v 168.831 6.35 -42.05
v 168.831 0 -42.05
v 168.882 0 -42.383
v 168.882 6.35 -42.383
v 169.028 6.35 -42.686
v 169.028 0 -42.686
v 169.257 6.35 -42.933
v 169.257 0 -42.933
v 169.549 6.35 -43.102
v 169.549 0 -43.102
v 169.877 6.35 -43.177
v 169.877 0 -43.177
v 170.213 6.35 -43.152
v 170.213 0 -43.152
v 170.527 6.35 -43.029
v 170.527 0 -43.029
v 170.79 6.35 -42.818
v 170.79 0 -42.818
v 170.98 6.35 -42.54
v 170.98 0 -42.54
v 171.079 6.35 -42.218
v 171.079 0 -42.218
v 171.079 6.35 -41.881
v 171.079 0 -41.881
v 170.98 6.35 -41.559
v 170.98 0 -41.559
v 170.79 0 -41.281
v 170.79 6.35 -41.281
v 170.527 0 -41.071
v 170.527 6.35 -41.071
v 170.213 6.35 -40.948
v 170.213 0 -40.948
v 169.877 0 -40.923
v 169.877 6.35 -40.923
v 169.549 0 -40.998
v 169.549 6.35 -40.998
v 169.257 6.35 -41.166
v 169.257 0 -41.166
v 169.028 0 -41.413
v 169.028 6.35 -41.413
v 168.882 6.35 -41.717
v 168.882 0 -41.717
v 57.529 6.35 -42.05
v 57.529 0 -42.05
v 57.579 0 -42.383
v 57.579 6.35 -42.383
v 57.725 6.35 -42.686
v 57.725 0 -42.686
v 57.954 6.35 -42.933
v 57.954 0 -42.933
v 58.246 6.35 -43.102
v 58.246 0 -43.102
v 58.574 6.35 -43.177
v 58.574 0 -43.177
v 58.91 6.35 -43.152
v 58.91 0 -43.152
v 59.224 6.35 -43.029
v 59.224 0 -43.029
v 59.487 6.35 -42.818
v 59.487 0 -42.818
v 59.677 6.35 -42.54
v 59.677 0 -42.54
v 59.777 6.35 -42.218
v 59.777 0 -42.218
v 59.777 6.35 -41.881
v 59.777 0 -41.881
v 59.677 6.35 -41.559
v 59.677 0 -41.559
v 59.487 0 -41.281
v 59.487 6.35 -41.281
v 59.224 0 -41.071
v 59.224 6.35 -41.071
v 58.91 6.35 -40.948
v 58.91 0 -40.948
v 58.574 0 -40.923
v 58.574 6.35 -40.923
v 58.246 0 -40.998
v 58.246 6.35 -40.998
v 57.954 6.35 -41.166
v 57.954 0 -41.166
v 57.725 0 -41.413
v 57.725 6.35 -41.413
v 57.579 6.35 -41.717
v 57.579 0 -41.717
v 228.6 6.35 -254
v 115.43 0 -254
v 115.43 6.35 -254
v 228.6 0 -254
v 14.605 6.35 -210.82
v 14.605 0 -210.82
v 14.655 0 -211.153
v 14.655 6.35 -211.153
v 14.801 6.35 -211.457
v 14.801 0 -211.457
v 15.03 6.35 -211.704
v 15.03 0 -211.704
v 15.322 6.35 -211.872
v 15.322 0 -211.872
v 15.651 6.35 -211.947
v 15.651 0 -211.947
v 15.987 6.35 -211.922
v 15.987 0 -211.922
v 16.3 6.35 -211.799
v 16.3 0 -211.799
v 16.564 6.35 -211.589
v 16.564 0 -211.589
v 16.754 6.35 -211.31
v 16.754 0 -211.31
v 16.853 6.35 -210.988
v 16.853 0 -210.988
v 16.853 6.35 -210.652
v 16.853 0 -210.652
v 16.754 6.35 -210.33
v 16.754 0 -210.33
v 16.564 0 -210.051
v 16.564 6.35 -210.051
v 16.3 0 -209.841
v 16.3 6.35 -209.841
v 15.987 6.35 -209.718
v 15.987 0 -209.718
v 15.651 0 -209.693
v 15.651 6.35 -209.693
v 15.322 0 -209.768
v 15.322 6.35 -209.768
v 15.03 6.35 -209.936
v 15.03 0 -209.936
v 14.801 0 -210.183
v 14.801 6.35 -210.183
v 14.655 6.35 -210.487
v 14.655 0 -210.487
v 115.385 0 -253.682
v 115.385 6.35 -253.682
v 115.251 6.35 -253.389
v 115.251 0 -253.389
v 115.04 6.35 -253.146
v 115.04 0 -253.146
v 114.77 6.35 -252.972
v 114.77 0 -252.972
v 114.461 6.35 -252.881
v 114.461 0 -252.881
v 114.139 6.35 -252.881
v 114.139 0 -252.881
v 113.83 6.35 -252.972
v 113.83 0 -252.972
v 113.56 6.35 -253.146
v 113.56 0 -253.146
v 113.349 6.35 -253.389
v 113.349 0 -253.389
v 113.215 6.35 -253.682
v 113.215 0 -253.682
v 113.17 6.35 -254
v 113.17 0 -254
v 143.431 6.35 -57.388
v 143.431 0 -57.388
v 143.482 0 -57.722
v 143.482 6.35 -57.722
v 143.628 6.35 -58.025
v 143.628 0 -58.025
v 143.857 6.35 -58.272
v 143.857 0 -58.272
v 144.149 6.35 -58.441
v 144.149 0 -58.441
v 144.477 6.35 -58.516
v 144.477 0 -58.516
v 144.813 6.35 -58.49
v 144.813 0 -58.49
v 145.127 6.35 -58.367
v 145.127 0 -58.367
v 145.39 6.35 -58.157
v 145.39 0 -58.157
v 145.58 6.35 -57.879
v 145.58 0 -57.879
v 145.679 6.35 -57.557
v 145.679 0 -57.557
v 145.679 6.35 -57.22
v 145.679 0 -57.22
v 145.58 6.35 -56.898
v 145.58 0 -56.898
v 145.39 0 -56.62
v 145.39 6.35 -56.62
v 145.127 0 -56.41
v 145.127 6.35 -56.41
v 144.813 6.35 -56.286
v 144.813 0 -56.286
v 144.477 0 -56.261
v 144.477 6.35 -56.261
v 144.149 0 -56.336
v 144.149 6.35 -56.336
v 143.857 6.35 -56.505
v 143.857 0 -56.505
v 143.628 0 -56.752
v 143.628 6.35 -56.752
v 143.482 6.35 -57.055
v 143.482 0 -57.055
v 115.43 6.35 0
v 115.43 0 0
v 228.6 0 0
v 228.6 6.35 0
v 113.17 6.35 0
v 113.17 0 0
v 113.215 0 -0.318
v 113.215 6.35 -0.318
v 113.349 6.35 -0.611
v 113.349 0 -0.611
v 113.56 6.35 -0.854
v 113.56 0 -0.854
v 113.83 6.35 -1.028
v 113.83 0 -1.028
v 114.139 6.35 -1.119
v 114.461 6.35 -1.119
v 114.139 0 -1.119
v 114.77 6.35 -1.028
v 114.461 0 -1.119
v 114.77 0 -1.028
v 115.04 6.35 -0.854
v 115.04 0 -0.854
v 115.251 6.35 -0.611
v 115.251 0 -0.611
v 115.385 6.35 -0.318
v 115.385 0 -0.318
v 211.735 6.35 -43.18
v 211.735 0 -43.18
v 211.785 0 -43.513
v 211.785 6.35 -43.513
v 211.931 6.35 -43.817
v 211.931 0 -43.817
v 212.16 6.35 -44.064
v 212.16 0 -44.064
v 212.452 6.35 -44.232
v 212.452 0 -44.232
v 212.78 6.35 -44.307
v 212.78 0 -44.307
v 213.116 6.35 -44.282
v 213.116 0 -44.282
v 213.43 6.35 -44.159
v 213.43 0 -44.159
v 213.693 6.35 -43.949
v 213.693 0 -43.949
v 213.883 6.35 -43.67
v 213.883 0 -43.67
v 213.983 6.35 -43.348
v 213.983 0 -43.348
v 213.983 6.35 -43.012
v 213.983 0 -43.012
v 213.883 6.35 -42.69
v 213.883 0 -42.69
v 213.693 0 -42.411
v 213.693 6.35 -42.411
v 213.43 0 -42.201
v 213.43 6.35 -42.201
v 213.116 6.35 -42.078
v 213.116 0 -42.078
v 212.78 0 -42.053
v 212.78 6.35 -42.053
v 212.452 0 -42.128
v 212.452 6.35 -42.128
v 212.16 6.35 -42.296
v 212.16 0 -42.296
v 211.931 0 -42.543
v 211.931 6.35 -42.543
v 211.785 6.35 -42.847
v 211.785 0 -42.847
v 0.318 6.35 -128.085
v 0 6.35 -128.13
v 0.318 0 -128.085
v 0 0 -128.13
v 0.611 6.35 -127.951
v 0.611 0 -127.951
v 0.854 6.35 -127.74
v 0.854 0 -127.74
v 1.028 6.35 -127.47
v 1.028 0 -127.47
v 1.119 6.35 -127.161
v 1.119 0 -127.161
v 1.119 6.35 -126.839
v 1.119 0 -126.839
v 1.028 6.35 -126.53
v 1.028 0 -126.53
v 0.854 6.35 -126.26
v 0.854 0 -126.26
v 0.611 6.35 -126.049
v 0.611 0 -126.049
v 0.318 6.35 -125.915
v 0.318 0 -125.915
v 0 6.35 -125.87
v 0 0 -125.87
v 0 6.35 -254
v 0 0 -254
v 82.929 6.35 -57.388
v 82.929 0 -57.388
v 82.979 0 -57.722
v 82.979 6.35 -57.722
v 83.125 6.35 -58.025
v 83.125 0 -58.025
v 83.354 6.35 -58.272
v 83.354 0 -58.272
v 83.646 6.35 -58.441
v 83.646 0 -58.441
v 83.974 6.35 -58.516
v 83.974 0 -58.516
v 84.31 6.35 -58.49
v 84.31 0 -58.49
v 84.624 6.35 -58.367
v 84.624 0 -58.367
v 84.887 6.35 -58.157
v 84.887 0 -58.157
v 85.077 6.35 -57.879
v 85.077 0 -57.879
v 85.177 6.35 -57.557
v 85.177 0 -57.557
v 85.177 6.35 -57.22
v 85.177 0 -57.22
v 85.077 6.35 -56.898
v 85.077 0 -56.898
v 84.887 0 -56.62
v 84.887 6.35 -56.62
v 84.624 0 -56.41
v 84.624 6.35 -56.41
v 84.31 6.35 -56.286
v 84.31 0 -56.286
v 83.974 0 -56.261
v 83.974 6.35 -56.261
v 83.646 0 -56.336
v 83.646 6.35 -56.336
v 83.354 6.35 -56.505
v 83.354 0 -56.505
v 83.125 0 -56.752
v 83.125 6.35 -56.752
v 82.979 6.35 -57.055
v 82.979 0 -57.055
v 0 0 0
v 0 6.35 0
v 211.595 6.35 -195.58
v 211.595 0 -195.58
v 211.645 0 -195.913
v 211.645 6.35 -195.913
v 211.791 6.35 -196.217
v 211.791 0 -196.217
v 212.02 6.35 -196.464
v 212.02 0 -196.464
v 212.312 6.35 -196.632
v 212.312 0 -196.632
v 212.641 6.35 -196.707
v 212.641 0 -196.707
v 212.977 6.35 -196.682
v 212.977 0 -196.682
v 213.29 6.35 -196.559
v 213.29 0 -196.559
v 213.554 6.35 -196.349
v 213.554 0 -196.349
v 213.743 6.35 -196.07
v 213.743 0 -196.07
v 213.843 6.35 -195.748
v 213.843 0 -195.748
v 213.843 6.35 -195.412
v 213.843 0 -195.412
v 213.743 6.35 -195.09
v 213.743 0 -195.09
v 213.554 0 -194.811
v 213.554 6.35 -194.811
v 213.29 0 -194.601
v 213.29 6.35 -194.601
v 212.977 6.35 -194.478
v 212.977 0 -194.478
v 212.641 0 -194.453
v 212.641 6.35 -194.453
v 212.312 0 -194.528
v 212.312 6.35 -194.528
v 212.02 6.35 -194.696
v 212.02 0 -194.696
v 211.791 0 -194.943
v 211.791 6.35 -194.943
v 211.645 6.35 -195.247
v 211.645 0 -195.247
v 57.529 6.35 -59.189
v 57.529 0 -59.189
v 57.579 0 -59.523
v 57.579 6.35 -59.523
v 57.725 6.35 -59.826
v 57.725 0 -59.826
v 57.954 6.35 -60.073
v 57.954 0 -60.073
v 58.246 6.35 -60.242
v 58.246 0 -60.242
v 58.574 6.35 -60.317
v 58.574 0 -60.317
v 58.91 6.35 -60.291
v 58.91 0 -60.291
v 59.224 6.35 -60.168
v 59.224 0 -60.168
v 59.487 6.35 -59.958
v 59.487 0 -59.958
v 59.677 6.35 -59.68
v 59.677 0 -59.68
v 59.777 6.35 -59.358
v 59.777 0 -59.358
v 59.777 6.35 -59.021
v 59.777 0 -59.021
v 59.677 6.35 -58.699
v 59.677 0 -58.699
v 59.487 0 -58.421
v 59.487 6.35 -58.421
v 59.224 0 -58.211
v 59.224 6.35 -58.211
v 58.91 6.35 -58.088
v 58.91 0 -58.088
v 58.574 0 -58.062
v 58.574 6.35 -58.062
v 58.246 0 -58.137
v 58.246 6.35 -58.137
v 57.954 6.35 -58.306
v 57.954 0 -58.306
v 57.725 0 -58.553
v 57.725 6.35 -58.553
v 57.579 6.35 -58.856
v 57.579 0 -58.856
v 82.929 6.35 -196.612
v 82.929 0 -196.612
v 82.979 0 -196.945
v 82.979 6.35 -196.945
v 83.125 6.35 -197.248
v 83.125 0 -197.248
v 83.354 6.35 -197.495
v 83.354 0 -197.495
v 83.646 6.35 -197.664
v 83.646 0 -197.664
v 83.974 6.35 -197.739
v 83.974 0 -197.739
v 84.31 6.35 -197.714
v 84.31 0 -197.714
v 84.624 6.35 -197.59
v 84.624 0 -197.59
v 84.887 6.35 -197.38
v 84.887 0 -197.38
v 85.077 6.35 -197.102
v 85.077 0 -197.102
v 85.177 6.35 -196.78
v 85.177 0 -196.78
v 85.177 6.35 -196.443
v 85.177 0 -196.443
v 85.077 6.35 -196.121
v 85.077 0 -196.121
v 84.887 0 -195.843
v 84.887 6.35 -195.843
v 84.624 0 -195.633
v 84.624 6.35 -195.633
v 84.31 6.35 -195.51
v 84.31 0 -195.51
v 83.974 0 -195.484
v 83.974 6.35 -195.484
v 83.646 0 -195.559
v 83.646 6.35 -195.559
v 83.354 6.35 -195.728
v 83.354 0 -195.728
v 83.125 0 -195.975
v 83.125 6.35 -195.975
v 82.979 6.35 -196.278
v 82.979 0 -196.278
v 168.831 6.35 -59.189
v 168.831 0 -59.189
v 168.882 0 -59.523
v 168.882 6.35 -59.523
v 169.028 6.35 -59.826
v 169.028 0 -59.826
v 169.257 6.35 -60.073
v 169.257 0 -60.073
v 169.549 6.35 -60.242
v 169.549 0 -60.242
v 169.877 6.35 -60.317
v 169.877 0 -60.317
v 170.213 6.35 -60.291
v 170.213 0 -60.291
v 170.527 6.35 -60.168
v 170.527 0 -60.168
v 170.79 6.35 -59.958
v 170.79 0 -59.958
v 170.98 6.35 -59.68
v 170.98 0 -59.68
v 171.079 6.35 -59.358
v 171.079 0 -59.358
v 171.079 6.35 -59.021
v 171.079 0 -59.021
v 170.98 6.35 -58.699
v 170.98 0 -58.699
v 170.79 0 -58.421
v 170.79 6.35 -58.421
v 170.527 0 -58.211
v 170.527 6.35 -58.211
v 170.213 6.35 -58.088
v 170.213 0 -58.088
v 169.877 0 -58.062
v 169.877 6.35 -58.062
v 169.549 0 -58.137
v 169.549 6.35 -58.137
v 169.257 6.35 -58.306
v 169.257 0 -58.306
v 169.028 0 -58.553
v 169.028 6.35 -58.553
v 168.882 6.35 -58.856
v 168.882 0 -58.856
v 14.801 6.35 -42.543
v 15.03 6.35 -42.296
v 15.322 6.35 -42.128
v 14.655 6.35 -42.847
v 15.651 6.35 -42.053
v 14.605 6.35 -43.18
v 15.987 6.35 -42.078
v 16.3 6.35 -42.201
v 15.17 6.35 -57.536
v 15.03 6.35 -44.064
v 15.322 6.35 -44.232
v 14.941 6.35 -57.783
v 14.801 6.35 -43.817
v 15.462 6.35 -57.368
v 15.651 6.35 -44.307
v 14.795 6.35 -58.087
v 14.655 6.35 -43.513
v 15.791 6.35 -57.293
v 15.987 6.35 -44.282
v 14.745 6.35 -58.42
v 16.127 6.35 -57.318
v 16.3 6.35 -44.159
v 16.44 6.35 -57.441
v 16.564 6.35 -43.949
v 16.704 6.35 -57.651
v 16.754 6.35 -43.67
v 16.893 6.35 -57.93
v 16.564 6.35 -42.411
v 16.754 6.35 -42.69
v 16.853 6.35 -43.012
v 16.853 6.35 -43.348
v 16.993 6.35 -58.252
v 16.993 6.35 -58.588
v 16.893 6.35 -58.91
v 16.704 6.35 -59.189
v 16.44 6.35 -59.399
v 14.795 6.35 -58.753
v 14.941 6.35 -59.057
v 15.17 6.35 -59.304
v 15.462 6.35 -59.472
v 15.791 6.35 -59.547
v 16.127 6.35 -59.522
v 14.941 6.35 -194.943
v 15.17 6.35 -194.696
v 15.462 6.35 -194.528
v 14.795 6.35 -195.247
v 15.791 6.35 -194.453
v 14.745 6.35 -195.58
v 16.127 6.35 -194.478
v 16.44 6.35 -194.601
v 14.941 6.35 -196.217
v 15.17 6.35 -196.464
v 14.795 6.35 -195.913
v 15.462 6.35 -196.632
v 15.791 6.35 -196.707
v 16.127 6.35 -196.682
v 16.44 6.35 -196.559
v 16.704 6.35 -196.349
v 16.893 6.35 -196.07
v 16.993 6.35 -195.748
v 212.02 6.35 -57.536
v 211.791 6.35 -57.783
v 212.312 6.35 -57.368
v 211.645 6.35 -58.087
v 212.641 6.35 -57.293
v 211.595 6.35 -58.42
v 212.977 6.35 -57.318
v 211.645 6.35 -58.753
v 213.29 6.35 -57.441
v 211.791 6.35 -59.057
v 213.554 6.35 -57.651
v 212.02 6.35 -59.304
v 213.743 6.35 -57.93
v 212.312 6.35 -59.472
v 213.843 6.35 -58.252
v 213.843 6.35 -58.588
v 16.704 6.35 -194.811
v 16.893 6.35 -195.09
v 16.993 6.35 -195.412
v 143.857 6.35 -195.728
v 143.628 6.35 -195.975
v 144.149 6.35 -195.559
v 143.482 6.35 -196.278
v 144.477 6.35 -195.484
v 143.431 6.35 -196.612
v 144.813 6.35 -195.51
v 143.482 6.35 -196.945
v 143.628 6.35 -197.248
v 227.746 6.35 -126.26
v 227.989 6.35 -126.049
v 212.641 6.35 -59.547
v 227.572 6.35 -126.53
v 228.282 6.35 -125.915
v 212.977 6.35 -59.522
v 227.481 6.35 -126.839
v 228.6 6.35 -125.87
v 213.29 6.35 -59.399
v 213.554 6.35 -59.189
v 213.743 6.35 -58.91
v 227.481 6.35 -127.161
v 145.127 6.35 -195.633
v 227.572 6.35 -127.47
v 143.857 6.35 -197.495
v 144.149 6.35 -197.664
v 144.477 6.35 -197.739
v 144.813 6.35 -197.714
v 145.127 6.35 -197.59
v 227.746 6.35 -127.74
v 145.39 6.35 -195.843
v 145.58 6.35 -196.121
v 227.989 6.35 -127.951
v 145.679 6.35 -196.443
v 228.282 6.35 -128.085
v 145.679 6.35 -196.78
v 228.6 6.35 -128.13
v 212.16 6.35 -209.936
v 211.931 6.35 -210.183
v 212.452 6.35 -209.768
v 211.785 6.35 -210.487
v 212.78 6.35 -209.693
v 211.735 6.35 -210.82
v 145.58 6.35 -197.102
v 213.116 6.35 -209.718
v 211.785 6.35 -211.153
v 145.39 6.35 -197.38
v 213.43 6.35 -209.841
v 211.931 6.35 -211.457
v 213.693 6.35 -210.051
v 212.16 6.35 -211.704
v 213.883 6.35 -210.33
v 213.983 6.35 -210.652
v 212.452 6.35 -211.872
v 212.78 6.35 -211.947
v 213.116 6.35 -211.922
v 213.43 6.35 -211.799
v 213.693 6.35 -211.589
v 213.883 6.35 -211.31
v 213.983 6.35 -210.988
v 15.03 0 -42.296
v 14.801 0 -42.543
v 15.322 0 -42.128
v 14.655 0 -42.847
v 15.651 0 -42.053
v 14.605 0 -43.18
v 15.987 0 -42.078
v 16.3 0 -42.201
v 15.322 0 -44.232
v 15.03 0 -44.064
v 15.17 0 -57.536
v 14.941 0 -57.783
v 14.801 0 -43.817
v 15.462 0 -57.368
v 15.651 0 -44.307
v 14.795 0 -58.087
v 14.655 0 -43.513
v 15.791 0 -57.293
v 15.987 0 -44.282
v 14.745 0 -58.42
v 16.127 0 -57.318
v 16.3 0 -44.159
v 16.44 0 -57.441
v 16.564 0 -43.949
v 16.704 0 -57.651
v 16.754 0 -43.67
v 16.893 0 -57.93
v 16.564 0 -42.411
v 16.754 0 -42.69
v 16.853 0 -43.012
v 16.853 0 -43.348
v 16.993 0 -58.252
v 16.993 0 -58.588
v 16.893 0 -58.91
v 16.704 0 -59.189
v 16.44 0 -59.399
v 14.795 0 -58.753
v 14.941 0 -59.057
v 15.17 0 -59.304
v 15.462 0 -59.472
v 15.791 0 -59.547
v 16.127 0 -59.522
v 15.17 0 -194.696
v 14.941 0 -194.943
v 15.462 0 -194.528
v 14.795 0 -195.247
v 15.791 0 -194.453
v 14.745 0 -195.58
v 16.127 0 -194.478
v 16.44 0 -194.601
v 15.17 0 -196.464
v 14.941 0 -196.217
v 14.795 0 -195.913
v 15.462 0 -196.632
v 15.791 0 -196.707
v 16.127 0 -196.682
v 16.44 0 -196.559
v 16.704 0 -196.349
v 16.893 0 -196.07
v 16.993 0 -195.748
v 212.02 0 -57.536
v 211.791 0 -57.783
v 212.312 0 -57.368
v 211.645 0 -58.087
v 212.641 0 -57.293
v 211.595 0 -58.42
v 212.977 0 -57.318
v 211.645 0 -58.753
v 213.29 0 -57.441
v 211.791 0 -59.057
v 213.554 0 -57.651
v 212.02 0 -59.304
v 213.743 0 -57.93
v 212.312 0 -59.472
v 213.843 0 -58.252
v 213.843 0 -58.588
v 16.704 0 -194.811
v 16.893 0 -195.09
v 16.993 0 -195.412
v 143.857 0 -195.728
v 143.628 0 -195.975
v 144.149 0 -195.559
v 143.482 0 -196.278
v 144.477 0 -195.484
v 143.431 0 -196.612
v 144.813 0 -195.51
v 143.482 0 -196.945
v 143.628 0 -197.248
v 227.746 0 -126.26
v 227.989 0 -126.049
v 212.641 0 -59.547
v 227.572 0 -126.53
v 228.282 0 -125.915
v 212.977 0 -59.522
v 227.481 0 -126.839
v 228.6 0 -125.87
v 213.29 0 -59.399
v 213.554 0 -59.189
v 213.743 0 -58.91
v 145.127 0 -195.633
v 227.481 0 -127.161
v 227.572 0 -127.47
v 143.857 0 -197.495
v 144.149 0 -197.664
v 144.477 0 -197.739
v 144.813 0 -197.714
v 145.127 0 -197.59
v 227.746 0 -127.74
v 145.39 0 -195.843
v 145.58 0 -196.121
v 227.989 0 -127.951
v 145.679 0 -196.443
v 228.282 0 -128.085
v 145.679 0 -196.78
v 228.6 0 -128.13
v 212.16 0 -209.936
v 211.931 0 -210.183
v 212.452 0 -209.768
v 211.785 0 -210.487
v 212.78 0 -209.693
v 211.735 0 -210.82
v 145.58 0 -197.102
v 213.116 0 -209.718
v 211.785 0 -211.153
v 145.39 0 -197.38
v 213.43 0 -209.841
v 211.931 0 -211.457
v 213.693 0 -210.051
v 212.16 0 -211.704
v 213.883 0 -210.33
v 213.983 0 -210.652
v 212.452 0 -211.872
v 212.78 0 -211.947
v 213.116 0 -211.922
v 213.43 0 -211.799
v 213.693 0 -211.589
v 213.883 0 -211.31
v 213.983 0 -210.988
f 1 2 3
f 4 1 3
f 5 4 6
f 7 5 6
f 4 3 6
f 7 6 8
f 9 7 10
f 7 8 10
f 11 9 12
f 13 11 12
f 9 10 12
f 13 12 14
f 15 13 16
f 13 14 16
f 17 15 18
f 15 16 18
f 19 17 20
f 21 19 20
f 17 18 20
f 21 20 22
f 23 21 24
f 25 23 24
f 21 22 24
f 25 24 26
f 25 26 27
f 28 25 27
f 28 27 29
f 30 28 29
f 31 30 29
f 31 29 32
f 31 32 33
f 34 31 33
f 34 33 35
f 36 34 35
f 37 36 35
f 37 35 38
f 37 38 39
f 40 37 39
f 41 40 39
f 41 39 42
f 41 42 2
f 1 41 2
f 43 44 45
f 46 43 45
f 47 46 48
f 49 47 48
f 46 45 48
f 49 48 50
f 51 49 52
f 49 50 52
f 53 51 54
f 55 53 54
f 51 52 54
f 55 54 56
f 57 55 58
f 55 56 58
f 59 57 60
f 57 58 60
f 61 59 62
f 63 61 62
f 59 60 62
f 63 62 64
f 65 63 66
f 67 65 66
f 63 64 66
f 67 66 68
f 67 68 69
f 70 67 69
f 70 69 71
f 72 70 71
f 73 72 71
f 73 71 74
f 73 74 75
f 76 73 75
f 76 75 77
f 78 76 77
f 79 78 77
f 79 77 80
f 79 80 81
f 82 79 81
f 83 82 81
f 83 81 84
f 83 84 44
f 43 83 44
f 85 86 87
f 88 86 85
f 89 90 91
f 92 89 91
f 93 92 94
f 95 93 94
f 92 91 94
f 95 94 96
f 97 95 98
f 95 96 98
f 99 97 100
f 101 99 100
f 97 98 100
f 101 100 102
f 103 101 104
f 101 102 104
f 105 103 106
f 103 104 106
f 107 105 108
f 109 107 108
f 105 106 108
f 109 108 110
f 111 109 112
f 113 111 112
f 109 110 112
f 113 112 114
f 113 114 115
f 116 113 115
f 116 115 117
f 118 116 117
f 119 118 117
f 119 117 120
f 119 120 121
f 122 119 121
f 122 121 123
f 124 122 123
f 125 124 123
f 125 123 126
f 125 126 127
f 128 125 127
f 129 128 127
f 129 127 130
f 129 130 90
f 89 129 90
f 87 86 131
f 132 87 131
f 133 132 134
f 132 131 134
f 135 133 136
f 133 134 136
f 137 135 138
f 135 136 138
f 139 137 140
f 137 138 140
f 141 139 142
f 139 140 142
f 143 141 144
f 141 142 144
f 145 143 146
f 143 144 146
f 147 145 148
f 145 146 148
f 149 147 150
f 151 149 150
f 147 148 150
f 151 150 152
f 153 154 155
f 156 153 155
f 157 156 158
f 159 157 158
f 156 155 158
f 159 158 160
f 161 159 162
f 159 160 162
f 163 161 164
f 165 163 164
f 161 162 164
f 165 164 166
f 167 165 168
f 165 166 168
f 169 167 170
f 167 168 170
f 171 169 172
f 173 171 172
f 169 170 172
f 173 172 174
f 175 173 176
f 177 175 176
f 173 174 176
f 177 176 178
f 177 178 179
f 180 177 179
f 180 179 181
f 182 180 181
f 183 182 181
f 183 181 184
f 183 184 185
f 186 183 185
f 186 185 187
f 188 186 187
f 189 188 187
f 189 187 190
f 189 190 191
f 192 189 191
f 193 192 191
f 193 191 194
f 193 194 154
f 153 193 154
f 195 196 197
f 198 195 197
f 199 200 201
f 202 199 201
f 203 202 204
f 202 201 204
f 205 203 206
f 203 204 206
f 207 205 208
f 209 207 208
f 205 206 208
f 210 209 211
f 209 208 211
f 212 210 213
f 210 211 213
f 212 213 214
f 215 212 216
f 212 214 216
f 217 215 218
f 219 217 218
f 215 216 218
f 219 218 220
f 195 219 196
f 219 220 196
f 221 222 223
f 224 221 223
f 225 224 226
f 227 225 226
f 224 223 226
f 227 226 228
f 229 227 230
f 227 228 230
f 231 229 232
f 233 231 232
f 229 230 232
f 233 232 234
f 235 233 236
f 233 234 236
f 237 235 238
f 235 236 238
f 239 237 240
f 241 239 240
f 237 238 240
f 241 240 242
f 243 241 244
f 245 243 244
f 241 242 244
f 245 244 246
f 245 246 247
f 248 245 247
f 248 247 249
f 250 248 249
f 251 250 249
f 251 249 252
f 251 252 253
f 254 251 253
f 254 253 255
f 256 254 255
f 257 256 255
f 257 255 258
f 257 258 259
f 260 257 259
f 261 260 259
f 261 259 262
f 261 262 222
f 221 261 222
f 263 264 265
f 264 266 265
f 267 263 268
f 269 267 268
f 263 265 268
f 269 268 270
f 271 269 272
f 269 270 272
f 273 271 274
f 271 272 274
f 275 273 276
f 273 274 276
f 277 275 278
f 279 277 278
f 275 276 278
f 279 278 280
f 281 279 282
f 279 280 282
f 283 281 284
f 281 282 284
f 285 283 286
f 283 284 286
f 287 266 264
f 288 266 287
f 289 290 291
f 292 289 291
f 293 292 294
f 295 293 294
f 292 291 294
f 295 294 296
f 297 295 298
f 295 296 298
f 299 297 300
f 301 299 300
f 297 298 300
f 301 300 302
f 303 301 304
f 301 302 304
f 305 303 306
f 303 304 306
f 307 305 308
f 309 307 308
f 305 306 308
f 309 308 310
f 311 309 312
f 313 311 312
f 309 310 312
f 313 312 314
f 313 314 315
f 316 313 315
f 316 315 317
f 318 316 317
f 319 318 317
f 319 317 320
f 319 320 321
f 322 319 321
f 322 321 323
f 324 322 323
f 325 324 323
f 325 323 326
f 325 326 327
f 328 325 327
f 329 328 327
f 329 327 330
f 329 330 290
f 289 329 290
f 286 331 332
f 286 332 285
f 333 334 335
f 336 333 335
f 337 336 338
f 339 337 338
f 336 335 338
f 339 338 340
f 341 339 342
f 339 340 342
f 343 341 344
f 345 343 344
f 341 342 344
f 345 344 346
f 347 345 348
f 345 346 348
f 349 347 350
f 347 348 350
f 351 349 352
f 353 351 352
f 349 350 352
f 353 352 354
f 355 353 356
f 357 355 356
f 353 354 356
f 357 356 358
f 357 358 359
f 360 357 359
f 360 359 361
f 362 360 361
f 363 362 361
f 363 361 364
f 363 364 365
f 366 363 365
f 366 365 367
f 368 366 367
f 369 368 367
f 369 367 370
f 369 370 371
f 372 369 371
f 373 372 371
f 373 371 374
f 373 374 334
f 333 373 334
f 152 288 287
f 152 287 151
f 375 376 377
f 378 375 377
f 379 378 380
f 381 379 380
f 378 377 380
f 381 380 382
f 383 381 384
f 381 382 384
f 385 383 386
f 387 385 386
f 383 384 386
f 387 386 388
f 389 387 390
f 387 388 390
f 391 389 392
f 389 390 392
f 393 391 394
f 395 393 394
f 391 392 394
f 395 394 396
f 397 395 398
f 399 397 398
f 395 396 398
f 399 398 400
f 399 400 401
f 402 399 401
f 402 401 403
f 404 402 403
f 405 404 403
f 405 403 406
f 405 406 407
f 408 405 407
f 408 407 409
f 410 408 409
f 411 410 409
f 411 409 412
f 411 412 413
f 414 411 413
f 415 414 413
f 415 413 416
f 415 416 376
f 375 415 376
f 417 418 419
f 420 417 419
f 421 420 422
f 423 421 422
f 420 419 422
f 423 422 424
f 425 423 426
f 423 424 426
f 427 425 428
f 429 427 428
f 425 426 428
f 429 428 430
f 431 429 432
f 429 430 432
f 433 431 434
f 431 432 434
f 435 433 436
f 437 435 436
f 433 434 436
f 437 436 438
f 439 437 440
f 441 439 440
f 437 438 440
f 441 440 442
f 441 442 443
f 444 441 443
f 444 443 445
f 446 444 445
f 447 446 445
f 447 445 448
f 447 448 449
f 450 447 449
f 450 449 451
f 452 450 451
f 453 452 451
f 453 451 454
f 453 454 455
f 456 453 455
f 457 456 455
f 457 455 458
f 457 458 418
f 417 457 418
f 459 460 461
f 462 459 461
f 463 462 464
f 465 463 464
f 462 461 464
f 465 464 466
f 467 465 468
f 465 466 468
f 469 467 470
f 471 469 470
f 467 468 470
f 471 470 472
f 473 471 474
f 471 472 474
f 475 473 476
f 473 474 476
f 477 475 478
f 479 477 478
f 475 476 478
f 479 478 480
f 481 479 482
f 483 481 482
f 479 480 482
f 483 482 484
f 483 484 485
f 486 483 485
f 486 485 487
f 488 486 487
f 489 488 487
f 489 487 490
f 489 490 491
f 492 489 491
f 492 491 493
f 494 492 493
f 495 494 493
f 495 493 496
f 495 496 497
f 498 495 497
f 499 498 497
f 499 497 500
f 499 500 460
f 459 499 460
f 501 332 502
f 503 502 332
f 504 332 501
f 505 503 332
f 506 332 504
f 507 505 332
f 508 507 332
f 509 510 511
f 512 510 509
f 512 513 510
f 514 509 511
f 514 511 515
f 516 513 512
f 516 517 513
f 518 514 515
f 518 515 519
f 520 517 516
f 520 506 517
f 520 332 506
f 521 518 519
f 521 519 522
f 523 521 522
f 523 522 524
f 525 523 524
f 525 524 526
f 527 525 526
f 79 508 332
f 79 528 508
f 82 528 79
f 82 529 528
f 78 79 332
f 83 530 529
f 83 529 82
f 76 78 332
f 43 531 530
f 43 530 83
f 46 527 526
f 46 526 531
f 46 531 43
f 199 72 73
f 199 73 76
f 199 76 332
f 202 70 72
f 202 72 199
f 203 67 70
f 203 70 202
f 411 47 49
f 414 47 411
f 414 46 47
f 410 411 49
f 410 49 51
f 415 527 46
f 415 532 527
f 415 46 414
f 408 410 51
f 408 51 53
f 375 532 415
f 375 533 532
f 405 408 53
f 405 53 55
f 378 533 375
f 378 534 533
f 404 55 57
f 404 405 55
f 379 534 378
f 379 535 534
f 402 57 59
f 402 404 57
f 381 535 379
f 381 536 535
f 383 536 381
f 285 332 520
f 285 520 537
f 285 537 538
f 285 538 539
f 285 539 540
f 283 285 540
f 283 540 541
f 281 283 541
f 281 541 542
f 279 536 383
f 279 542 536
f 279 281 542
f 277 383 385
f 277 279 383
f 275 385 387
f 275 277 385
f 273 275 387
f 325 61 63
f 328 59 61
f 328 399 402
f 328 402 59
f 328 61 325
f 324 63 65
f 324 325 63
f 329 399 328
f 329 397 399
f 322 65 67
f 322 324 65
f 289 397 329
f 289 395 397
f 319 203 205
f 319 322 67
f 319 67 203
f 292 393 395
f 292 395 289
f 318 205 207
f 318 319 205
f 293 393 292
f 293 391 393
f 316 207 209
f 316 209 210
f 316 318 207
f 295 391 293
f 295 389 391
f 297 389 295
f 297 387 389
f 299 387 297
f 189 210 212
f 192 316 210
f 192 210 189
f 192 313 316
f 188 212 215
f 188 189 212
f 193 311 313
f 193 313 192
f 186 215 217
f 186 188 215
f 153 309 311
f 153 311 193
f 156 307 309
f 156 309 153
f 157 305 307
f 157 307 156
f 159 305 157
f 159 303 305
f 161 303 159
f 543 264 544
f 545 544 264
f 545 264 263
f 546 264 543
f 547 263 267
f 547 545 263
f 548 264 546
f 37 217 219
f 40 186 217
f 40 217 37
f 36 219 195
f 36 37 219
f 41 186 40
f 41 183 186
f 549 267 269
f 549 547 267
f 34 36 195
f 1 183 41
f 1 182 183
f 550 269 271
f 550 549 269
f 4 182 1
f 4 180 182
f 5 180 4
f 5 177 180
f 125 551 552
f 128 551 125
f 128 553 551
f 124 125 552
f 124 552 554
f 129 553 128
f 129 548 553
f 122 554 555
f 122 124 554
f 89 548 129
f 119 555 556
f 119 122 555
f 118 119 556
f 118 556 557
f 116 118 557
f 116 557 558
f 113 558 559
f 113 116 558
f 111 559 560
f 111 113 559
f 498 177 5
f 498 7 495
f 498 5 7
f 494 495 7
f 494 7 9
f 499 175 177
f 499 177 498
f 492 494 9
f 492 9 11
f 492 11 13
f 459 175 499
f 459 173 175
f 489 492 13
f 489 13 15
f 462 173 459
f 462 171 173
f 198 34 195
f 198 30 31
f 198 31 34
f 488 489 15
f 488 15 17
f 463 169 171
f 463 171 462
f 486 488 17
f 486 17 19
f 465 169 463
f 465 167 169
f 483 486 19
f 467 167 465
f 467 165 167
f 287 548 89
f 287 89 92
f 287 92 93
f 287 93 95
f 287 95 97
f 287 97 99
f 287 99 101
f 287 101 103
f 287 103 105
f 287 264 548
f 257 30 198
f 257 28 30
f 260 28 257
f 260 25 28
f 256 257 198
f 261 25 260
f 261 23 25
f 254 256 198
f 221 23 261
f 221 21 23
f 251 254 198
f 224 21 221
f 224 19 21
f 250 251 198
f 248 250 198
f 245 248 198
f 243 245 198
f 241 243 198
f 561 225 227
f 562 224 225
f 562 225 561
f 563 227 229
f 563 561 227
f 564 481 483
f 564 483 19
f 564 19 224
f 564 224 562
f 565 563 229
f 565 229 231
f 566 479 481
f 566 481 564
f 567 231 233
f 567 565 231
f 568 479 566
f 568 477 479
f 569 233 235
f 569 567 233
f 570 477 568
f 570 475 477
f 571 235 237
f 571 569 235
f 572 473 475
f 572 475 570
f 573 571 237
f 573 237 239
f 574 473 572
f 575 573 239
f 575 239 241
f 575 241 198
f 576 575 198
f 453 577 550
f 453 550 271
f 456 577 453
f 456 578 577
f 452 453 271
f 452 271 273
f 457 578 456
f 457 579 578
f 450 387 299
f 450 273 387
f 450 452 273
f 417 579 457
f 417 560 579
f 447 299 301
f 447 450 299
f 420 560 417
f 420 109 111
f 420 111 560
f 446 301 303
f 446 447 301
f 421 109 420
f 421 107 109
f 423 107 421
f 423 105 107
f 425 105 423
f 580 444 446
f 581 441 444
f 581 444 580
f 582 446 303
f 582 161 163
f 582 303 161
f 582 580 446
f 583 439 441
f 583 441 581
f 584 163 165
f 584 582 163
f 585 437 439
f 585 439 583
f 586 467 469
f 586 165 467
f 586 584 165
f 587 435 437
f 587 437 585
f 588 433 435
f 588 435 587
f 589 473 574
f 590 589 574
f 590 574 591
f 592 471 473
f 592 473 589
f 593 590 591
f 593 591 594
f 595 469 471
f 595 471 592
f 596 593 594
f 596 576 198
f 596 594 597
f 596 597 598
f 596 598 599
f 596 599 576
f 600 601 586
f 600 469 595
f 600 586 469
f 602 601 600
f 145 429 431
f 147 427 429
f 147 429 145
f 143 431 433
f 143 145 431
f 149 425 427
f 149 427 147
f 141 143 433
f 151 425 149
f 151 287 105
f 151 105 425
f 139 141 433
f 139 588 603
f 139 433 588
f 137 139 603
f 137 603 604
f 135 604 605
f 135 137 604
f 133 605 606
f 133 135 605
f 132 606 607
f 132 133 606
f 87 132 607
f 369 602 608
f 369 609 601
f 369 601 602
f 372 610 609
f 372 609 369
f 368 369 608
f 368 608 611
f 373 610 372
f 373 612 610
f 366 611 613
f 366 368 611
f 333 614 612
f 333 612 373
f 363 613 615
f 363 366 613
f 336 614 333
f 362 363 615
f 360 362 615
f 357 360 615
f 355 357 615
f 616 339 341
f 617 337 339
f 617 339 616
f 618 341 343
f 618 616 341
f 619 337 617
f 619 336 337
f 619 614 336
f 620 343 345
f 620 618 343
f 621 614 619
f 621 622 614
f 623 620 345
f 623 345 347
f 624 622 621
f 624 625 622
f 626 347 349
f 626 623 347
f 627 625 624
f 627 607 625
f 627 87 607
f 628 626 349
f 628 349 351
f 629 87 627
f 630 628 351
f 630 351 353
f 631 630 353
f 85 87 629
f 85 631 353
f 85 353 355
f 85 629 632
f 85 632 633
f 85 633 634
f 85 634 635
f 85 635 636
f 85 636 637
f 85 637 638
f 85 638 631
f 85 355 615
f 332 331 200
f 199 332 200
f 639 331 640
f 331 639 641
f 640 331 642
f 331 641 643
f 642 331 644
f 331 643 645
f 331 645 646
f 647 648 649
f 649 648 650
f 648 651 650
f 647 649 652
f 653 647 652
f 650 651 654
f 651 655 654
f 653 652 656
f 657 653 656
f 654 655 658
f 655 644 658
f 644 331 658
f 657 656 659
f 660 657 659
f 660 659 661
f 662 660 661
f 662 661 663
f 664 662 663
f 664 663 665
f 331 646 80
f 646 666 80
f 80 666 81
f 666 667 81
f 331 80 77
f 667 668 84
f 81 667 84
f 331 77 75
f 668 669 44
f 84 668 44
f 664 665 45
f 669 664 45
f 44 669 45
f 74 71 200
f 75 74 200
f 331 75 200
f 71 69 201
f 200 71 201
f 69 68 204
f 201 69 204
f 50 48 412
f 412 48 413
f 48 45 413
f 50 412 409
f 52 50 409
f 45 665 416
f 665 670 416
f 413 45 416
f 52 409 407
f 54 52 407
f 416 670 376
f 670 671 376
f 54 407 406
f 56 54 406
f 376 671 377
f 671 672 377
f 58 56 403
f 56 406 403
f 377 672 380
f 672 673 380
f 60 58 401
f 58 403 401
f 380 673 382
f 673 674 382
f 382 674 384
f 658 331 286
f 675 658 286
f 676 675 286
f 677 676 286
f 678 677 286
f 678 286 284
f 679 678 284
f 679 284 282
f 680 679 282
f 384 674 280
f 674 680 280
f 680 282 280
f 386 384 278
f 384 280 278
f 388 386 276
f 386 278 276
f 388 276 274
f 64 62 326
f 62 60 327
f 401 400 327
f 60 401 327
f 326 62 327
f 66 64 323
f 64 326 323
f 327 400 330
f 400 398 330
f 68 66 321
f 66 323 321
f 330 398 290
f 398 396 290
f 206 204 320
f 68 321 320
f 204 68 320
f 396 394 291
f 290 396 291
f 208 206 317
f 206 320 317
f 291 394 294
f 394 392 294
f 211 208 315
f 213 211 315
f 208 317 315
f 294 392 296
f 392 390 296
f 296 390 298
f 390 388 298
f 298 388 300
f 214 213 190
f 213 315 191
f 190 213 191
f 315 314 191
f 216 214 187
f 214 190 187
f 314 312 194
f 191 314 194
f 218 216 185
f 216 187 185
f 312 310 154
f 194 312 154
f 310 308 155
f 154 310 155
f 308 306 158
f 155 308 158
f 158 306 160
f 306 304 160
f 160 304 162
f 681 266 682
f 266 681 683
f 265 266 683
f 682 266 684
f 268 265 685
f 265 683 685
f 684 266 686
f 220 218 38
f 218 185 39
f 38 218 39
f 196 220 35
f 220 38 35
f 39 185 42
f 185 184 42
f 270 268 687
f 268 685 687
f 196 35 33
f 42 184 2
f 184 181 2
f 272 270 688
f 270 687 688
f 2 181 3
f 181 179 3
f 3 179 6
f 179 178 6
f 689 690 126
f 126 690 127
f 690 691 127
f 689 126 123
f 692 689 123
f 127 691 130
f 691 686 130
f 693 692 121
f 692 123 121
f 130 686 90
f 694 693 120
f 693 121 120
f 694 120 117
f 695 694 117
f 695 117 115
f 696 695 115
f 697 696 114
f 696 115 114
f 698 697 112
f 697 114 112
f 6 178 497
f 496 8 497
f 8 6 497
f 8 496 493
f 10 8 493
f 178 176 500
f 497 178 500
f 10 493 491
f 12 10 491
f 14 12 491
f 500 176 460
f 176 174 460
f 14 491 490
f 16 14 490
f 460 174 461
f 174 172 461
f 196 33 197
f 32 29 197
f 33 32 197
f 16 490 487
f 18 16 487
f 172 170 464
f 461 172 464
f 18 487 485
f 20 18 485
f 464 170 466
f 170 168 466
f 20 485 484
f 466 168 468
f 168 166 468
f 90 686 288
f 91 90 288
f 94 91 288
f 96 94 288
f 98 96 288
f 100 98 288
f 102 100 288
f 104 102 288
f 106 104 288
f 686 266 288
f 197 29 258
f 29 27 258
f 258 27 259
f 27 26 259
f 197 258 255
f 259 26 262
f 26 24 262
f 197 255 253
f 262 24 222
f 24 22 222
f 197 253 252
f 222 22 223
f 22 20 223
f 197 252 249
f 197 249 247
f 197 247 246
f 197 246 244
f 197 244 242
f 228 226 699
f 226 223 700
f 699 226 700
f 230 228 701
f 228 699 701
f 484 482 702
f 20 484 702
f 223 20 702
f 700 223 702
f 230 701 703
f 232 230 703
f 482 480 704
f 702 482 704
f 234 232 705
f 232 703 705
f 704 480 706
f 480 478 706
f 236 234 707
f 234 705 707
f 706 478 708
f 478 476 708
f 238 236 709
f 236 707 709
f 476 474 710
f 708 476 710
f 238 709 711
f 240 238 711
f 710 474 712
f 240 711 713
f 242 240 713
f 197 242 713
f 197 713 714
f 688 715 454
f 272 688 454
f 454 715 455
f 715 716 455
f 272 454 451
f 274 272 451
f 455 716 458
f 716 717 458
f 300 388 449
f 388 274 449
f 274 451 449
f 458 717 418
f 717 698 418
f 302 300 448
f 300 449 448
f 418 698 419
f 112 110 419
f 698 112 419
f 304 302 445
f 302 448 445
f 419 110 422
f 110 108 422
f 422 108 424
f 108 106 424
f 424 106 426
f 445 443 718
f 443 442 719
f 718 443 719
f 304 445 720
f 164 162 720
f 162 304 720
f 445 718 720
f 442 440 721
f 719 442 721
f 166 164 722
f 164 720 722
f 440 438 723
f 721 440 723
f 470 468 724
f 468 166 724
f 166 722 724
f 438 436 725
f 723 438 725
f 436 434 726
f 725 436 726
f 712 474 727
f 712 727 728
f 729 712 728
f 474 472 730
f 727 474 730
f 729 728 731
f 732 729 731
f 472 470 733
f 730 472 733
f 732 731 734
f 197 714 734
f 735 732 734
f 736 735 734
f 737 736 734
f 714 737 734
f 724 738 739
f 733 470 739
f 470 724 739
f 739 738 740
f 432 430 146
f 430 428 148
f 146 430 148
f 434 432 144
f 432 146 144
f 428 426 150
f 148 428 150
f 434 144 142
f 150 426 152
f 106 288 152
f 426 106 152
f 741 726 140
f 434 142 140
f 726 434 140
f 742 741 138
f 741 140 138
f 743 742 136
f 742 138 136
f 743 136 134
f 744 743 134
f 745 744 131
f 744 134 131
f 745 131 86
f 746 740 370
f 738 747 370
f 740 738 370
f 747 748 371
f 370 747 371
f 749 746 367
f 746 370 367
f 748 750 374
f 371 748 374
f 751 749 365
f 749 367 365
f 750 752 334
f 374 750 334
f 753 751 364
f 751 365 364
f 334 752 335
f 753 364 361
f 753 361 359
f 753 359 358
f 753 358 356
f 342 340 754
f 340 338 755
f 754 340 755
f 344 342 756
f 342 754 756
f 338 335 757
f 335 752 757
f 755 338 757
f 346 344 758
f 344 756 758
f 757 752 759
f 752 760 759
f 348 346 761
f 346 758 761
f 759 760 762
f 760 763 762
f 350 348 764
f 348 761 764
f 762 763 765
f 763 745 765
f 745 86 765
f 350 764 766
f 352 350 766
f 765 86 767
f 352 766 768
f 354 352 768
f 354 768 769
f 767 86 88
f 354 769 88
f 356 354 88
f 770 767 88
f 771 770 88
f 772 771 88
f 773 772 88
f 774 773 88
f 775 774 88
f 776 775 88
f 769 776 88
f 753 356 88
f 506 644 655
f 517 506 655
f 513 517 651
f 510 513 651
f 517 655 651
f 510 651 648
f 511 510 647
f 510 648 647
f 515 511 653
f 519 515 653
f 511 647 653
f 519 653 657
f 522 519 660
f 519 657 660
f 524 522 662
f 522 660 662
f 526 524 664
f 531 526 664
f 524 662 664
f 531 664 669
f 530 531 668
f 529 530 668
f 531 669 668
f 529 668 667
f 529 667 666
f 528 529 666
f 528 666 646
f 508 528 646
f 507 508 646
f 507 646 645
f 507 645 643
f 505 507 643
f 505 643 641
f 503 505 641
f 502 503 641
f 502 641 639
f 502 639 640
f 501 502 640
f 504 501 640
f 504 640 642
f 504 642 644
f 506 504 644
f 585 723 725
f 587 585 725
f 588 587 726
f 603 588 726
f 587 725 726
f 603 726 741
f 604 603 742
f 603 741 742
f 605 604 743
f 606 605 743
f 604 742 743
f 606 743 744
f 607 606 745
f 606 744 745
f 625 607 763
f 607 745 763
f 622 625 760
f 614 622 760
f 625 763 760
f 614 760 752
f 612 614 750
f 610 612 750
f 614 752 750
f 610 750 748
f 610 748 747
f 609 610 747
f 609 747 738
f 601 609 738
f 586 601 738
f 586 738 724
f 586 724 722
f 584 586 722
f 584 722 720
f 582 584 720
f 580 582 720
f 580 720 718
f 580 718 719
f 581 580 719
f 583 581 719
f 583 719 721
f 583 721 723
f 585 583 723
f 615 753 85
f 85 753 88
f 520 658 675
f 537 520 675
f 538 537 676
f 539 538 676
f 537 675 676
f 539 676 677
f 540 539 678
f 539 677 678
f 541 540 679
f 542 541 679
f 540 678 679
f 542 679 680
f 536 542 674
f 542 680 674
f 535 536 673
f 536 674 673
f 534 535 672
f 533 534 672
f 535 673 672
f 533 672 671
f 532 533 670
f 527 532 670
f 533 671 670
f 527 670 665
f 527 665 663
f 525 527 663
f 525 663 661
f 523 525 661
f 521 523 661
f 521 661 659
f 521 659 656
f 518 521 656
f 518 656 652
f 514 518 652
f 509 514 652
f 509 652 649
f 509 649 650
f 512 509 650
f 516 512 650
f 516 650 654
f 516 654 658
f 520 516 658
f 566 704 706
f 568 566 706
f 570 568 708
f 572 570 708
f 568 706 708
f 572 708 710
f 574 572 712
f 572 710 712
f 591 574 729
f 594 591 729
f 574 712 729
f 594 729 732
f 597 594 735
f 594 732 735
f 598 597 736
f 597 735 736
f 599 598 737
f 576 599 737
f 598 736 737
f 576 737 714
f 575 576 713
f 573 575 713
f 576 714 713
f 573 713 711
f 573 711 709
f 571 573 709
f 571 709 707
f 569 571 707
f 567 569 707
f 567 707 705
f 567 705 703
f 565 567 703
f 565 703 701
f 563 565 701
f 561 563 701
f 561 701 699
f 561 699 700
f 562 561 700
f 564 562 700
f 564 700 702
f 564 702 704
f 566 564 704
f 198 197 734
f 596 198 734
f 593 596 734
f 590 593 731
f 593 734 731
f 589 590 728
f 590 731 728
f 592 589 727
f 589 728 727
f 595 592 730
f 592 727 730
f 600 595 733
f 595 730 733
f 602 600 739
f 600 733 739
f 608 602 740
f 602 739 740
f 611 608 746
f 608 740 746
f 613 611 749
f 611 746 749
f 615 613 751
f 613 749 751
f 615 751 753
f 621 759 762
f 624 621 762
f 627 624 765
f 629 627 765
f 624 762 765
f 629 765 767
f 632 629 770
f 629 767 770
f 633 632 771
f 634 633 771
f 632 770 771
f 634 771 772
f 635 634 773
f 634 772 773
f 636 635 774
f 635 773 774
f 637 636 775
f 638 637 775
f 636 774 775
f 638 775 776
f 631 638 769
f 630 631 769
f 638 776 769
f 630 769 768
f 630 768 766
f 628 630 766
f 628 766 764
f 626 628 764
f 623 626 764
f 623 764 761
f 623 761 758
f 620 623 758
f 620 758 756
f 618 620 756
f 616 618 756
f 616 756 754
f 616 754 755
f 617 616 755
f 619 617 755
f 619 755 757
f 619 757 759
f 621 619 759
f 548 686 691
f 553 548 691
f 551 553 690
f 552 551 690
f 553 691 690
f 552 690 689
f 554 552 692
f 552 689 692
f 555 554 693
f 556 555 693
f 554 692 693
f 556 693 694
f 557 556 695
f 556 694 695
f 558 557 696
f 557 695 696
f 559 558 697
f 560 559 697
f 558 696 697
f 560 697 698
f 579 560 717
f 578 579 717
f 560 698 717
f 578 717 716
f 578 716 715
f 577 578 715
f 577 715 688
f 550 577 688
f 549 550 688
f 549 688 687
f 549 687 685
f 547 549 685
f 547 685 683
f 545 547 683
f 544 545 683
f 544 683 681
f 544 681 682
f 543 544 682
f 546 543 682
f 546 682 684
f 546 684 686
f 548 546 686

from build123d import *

# Parameters (mm, degrees)
SKETCH1_W             = 228.6
SKETCH1_H             = 254
BOSS_EXTRUDE1_DEPTH   = 6.35
F_4_40_TAPPED_HOLE1_D = 2.2606
F_4_40_TAPPED_HOLE2_D = 2.2606


with BuildPart() as part:
    # Sketch1 → Boss-Extrude1 (new body)
    with BuildSketch(Plane(origin=(0, 0, 0), x_dir=(1, 0, 0), z_dir=(0, 1, 0))):
        with Locations((114.3, 127)):
            Rectangle(SKETCH1_W, SKETCH1_H)
    extrude(amount=BOSS_EXTRUDE1_DEPTH)

    # #4-40 Tapped Hole1 (through all)
    with Locations(Plane(origin=(0, 6.35, 0), x_dir=(1, 0, 0), z_dir=(0, 1, 0))):
        with Locations((15.735159407, 43.18), (15.875, 58.42), (84.05884141, 57.388437181), (144.561688198, 57.388437181), (0, 127), (144.561688198, 196.611562819), (84.05884141, 196.611562819), (15.875, 195.58), (15.735159407, 210.82), (114.3, 0), (212.864840593, 43.18), (212.725, 58.42), (212.864840593, 210.82), (212.725, 195.58), (228.6, 127), (114.3, 254)):
            Hole(F_4_40_TAPPED_HOLE1_D / 2)

    # #4-40 Tapped Hole2 (through all)
    with Locations(Plane(origin=(0, 6.35, 0), x_dir=(1, 0, 0), z_dir=(0, 1, 0))):
        with Locations((58.65884141, 59.18949303), (58.65884141, 42.0497), (169.961688198, 59.18949303), (169.961688198, 42.0497)):
            Hole(F_4_40_TAPPED_HOLE2_D / 2)


solid = part.part
